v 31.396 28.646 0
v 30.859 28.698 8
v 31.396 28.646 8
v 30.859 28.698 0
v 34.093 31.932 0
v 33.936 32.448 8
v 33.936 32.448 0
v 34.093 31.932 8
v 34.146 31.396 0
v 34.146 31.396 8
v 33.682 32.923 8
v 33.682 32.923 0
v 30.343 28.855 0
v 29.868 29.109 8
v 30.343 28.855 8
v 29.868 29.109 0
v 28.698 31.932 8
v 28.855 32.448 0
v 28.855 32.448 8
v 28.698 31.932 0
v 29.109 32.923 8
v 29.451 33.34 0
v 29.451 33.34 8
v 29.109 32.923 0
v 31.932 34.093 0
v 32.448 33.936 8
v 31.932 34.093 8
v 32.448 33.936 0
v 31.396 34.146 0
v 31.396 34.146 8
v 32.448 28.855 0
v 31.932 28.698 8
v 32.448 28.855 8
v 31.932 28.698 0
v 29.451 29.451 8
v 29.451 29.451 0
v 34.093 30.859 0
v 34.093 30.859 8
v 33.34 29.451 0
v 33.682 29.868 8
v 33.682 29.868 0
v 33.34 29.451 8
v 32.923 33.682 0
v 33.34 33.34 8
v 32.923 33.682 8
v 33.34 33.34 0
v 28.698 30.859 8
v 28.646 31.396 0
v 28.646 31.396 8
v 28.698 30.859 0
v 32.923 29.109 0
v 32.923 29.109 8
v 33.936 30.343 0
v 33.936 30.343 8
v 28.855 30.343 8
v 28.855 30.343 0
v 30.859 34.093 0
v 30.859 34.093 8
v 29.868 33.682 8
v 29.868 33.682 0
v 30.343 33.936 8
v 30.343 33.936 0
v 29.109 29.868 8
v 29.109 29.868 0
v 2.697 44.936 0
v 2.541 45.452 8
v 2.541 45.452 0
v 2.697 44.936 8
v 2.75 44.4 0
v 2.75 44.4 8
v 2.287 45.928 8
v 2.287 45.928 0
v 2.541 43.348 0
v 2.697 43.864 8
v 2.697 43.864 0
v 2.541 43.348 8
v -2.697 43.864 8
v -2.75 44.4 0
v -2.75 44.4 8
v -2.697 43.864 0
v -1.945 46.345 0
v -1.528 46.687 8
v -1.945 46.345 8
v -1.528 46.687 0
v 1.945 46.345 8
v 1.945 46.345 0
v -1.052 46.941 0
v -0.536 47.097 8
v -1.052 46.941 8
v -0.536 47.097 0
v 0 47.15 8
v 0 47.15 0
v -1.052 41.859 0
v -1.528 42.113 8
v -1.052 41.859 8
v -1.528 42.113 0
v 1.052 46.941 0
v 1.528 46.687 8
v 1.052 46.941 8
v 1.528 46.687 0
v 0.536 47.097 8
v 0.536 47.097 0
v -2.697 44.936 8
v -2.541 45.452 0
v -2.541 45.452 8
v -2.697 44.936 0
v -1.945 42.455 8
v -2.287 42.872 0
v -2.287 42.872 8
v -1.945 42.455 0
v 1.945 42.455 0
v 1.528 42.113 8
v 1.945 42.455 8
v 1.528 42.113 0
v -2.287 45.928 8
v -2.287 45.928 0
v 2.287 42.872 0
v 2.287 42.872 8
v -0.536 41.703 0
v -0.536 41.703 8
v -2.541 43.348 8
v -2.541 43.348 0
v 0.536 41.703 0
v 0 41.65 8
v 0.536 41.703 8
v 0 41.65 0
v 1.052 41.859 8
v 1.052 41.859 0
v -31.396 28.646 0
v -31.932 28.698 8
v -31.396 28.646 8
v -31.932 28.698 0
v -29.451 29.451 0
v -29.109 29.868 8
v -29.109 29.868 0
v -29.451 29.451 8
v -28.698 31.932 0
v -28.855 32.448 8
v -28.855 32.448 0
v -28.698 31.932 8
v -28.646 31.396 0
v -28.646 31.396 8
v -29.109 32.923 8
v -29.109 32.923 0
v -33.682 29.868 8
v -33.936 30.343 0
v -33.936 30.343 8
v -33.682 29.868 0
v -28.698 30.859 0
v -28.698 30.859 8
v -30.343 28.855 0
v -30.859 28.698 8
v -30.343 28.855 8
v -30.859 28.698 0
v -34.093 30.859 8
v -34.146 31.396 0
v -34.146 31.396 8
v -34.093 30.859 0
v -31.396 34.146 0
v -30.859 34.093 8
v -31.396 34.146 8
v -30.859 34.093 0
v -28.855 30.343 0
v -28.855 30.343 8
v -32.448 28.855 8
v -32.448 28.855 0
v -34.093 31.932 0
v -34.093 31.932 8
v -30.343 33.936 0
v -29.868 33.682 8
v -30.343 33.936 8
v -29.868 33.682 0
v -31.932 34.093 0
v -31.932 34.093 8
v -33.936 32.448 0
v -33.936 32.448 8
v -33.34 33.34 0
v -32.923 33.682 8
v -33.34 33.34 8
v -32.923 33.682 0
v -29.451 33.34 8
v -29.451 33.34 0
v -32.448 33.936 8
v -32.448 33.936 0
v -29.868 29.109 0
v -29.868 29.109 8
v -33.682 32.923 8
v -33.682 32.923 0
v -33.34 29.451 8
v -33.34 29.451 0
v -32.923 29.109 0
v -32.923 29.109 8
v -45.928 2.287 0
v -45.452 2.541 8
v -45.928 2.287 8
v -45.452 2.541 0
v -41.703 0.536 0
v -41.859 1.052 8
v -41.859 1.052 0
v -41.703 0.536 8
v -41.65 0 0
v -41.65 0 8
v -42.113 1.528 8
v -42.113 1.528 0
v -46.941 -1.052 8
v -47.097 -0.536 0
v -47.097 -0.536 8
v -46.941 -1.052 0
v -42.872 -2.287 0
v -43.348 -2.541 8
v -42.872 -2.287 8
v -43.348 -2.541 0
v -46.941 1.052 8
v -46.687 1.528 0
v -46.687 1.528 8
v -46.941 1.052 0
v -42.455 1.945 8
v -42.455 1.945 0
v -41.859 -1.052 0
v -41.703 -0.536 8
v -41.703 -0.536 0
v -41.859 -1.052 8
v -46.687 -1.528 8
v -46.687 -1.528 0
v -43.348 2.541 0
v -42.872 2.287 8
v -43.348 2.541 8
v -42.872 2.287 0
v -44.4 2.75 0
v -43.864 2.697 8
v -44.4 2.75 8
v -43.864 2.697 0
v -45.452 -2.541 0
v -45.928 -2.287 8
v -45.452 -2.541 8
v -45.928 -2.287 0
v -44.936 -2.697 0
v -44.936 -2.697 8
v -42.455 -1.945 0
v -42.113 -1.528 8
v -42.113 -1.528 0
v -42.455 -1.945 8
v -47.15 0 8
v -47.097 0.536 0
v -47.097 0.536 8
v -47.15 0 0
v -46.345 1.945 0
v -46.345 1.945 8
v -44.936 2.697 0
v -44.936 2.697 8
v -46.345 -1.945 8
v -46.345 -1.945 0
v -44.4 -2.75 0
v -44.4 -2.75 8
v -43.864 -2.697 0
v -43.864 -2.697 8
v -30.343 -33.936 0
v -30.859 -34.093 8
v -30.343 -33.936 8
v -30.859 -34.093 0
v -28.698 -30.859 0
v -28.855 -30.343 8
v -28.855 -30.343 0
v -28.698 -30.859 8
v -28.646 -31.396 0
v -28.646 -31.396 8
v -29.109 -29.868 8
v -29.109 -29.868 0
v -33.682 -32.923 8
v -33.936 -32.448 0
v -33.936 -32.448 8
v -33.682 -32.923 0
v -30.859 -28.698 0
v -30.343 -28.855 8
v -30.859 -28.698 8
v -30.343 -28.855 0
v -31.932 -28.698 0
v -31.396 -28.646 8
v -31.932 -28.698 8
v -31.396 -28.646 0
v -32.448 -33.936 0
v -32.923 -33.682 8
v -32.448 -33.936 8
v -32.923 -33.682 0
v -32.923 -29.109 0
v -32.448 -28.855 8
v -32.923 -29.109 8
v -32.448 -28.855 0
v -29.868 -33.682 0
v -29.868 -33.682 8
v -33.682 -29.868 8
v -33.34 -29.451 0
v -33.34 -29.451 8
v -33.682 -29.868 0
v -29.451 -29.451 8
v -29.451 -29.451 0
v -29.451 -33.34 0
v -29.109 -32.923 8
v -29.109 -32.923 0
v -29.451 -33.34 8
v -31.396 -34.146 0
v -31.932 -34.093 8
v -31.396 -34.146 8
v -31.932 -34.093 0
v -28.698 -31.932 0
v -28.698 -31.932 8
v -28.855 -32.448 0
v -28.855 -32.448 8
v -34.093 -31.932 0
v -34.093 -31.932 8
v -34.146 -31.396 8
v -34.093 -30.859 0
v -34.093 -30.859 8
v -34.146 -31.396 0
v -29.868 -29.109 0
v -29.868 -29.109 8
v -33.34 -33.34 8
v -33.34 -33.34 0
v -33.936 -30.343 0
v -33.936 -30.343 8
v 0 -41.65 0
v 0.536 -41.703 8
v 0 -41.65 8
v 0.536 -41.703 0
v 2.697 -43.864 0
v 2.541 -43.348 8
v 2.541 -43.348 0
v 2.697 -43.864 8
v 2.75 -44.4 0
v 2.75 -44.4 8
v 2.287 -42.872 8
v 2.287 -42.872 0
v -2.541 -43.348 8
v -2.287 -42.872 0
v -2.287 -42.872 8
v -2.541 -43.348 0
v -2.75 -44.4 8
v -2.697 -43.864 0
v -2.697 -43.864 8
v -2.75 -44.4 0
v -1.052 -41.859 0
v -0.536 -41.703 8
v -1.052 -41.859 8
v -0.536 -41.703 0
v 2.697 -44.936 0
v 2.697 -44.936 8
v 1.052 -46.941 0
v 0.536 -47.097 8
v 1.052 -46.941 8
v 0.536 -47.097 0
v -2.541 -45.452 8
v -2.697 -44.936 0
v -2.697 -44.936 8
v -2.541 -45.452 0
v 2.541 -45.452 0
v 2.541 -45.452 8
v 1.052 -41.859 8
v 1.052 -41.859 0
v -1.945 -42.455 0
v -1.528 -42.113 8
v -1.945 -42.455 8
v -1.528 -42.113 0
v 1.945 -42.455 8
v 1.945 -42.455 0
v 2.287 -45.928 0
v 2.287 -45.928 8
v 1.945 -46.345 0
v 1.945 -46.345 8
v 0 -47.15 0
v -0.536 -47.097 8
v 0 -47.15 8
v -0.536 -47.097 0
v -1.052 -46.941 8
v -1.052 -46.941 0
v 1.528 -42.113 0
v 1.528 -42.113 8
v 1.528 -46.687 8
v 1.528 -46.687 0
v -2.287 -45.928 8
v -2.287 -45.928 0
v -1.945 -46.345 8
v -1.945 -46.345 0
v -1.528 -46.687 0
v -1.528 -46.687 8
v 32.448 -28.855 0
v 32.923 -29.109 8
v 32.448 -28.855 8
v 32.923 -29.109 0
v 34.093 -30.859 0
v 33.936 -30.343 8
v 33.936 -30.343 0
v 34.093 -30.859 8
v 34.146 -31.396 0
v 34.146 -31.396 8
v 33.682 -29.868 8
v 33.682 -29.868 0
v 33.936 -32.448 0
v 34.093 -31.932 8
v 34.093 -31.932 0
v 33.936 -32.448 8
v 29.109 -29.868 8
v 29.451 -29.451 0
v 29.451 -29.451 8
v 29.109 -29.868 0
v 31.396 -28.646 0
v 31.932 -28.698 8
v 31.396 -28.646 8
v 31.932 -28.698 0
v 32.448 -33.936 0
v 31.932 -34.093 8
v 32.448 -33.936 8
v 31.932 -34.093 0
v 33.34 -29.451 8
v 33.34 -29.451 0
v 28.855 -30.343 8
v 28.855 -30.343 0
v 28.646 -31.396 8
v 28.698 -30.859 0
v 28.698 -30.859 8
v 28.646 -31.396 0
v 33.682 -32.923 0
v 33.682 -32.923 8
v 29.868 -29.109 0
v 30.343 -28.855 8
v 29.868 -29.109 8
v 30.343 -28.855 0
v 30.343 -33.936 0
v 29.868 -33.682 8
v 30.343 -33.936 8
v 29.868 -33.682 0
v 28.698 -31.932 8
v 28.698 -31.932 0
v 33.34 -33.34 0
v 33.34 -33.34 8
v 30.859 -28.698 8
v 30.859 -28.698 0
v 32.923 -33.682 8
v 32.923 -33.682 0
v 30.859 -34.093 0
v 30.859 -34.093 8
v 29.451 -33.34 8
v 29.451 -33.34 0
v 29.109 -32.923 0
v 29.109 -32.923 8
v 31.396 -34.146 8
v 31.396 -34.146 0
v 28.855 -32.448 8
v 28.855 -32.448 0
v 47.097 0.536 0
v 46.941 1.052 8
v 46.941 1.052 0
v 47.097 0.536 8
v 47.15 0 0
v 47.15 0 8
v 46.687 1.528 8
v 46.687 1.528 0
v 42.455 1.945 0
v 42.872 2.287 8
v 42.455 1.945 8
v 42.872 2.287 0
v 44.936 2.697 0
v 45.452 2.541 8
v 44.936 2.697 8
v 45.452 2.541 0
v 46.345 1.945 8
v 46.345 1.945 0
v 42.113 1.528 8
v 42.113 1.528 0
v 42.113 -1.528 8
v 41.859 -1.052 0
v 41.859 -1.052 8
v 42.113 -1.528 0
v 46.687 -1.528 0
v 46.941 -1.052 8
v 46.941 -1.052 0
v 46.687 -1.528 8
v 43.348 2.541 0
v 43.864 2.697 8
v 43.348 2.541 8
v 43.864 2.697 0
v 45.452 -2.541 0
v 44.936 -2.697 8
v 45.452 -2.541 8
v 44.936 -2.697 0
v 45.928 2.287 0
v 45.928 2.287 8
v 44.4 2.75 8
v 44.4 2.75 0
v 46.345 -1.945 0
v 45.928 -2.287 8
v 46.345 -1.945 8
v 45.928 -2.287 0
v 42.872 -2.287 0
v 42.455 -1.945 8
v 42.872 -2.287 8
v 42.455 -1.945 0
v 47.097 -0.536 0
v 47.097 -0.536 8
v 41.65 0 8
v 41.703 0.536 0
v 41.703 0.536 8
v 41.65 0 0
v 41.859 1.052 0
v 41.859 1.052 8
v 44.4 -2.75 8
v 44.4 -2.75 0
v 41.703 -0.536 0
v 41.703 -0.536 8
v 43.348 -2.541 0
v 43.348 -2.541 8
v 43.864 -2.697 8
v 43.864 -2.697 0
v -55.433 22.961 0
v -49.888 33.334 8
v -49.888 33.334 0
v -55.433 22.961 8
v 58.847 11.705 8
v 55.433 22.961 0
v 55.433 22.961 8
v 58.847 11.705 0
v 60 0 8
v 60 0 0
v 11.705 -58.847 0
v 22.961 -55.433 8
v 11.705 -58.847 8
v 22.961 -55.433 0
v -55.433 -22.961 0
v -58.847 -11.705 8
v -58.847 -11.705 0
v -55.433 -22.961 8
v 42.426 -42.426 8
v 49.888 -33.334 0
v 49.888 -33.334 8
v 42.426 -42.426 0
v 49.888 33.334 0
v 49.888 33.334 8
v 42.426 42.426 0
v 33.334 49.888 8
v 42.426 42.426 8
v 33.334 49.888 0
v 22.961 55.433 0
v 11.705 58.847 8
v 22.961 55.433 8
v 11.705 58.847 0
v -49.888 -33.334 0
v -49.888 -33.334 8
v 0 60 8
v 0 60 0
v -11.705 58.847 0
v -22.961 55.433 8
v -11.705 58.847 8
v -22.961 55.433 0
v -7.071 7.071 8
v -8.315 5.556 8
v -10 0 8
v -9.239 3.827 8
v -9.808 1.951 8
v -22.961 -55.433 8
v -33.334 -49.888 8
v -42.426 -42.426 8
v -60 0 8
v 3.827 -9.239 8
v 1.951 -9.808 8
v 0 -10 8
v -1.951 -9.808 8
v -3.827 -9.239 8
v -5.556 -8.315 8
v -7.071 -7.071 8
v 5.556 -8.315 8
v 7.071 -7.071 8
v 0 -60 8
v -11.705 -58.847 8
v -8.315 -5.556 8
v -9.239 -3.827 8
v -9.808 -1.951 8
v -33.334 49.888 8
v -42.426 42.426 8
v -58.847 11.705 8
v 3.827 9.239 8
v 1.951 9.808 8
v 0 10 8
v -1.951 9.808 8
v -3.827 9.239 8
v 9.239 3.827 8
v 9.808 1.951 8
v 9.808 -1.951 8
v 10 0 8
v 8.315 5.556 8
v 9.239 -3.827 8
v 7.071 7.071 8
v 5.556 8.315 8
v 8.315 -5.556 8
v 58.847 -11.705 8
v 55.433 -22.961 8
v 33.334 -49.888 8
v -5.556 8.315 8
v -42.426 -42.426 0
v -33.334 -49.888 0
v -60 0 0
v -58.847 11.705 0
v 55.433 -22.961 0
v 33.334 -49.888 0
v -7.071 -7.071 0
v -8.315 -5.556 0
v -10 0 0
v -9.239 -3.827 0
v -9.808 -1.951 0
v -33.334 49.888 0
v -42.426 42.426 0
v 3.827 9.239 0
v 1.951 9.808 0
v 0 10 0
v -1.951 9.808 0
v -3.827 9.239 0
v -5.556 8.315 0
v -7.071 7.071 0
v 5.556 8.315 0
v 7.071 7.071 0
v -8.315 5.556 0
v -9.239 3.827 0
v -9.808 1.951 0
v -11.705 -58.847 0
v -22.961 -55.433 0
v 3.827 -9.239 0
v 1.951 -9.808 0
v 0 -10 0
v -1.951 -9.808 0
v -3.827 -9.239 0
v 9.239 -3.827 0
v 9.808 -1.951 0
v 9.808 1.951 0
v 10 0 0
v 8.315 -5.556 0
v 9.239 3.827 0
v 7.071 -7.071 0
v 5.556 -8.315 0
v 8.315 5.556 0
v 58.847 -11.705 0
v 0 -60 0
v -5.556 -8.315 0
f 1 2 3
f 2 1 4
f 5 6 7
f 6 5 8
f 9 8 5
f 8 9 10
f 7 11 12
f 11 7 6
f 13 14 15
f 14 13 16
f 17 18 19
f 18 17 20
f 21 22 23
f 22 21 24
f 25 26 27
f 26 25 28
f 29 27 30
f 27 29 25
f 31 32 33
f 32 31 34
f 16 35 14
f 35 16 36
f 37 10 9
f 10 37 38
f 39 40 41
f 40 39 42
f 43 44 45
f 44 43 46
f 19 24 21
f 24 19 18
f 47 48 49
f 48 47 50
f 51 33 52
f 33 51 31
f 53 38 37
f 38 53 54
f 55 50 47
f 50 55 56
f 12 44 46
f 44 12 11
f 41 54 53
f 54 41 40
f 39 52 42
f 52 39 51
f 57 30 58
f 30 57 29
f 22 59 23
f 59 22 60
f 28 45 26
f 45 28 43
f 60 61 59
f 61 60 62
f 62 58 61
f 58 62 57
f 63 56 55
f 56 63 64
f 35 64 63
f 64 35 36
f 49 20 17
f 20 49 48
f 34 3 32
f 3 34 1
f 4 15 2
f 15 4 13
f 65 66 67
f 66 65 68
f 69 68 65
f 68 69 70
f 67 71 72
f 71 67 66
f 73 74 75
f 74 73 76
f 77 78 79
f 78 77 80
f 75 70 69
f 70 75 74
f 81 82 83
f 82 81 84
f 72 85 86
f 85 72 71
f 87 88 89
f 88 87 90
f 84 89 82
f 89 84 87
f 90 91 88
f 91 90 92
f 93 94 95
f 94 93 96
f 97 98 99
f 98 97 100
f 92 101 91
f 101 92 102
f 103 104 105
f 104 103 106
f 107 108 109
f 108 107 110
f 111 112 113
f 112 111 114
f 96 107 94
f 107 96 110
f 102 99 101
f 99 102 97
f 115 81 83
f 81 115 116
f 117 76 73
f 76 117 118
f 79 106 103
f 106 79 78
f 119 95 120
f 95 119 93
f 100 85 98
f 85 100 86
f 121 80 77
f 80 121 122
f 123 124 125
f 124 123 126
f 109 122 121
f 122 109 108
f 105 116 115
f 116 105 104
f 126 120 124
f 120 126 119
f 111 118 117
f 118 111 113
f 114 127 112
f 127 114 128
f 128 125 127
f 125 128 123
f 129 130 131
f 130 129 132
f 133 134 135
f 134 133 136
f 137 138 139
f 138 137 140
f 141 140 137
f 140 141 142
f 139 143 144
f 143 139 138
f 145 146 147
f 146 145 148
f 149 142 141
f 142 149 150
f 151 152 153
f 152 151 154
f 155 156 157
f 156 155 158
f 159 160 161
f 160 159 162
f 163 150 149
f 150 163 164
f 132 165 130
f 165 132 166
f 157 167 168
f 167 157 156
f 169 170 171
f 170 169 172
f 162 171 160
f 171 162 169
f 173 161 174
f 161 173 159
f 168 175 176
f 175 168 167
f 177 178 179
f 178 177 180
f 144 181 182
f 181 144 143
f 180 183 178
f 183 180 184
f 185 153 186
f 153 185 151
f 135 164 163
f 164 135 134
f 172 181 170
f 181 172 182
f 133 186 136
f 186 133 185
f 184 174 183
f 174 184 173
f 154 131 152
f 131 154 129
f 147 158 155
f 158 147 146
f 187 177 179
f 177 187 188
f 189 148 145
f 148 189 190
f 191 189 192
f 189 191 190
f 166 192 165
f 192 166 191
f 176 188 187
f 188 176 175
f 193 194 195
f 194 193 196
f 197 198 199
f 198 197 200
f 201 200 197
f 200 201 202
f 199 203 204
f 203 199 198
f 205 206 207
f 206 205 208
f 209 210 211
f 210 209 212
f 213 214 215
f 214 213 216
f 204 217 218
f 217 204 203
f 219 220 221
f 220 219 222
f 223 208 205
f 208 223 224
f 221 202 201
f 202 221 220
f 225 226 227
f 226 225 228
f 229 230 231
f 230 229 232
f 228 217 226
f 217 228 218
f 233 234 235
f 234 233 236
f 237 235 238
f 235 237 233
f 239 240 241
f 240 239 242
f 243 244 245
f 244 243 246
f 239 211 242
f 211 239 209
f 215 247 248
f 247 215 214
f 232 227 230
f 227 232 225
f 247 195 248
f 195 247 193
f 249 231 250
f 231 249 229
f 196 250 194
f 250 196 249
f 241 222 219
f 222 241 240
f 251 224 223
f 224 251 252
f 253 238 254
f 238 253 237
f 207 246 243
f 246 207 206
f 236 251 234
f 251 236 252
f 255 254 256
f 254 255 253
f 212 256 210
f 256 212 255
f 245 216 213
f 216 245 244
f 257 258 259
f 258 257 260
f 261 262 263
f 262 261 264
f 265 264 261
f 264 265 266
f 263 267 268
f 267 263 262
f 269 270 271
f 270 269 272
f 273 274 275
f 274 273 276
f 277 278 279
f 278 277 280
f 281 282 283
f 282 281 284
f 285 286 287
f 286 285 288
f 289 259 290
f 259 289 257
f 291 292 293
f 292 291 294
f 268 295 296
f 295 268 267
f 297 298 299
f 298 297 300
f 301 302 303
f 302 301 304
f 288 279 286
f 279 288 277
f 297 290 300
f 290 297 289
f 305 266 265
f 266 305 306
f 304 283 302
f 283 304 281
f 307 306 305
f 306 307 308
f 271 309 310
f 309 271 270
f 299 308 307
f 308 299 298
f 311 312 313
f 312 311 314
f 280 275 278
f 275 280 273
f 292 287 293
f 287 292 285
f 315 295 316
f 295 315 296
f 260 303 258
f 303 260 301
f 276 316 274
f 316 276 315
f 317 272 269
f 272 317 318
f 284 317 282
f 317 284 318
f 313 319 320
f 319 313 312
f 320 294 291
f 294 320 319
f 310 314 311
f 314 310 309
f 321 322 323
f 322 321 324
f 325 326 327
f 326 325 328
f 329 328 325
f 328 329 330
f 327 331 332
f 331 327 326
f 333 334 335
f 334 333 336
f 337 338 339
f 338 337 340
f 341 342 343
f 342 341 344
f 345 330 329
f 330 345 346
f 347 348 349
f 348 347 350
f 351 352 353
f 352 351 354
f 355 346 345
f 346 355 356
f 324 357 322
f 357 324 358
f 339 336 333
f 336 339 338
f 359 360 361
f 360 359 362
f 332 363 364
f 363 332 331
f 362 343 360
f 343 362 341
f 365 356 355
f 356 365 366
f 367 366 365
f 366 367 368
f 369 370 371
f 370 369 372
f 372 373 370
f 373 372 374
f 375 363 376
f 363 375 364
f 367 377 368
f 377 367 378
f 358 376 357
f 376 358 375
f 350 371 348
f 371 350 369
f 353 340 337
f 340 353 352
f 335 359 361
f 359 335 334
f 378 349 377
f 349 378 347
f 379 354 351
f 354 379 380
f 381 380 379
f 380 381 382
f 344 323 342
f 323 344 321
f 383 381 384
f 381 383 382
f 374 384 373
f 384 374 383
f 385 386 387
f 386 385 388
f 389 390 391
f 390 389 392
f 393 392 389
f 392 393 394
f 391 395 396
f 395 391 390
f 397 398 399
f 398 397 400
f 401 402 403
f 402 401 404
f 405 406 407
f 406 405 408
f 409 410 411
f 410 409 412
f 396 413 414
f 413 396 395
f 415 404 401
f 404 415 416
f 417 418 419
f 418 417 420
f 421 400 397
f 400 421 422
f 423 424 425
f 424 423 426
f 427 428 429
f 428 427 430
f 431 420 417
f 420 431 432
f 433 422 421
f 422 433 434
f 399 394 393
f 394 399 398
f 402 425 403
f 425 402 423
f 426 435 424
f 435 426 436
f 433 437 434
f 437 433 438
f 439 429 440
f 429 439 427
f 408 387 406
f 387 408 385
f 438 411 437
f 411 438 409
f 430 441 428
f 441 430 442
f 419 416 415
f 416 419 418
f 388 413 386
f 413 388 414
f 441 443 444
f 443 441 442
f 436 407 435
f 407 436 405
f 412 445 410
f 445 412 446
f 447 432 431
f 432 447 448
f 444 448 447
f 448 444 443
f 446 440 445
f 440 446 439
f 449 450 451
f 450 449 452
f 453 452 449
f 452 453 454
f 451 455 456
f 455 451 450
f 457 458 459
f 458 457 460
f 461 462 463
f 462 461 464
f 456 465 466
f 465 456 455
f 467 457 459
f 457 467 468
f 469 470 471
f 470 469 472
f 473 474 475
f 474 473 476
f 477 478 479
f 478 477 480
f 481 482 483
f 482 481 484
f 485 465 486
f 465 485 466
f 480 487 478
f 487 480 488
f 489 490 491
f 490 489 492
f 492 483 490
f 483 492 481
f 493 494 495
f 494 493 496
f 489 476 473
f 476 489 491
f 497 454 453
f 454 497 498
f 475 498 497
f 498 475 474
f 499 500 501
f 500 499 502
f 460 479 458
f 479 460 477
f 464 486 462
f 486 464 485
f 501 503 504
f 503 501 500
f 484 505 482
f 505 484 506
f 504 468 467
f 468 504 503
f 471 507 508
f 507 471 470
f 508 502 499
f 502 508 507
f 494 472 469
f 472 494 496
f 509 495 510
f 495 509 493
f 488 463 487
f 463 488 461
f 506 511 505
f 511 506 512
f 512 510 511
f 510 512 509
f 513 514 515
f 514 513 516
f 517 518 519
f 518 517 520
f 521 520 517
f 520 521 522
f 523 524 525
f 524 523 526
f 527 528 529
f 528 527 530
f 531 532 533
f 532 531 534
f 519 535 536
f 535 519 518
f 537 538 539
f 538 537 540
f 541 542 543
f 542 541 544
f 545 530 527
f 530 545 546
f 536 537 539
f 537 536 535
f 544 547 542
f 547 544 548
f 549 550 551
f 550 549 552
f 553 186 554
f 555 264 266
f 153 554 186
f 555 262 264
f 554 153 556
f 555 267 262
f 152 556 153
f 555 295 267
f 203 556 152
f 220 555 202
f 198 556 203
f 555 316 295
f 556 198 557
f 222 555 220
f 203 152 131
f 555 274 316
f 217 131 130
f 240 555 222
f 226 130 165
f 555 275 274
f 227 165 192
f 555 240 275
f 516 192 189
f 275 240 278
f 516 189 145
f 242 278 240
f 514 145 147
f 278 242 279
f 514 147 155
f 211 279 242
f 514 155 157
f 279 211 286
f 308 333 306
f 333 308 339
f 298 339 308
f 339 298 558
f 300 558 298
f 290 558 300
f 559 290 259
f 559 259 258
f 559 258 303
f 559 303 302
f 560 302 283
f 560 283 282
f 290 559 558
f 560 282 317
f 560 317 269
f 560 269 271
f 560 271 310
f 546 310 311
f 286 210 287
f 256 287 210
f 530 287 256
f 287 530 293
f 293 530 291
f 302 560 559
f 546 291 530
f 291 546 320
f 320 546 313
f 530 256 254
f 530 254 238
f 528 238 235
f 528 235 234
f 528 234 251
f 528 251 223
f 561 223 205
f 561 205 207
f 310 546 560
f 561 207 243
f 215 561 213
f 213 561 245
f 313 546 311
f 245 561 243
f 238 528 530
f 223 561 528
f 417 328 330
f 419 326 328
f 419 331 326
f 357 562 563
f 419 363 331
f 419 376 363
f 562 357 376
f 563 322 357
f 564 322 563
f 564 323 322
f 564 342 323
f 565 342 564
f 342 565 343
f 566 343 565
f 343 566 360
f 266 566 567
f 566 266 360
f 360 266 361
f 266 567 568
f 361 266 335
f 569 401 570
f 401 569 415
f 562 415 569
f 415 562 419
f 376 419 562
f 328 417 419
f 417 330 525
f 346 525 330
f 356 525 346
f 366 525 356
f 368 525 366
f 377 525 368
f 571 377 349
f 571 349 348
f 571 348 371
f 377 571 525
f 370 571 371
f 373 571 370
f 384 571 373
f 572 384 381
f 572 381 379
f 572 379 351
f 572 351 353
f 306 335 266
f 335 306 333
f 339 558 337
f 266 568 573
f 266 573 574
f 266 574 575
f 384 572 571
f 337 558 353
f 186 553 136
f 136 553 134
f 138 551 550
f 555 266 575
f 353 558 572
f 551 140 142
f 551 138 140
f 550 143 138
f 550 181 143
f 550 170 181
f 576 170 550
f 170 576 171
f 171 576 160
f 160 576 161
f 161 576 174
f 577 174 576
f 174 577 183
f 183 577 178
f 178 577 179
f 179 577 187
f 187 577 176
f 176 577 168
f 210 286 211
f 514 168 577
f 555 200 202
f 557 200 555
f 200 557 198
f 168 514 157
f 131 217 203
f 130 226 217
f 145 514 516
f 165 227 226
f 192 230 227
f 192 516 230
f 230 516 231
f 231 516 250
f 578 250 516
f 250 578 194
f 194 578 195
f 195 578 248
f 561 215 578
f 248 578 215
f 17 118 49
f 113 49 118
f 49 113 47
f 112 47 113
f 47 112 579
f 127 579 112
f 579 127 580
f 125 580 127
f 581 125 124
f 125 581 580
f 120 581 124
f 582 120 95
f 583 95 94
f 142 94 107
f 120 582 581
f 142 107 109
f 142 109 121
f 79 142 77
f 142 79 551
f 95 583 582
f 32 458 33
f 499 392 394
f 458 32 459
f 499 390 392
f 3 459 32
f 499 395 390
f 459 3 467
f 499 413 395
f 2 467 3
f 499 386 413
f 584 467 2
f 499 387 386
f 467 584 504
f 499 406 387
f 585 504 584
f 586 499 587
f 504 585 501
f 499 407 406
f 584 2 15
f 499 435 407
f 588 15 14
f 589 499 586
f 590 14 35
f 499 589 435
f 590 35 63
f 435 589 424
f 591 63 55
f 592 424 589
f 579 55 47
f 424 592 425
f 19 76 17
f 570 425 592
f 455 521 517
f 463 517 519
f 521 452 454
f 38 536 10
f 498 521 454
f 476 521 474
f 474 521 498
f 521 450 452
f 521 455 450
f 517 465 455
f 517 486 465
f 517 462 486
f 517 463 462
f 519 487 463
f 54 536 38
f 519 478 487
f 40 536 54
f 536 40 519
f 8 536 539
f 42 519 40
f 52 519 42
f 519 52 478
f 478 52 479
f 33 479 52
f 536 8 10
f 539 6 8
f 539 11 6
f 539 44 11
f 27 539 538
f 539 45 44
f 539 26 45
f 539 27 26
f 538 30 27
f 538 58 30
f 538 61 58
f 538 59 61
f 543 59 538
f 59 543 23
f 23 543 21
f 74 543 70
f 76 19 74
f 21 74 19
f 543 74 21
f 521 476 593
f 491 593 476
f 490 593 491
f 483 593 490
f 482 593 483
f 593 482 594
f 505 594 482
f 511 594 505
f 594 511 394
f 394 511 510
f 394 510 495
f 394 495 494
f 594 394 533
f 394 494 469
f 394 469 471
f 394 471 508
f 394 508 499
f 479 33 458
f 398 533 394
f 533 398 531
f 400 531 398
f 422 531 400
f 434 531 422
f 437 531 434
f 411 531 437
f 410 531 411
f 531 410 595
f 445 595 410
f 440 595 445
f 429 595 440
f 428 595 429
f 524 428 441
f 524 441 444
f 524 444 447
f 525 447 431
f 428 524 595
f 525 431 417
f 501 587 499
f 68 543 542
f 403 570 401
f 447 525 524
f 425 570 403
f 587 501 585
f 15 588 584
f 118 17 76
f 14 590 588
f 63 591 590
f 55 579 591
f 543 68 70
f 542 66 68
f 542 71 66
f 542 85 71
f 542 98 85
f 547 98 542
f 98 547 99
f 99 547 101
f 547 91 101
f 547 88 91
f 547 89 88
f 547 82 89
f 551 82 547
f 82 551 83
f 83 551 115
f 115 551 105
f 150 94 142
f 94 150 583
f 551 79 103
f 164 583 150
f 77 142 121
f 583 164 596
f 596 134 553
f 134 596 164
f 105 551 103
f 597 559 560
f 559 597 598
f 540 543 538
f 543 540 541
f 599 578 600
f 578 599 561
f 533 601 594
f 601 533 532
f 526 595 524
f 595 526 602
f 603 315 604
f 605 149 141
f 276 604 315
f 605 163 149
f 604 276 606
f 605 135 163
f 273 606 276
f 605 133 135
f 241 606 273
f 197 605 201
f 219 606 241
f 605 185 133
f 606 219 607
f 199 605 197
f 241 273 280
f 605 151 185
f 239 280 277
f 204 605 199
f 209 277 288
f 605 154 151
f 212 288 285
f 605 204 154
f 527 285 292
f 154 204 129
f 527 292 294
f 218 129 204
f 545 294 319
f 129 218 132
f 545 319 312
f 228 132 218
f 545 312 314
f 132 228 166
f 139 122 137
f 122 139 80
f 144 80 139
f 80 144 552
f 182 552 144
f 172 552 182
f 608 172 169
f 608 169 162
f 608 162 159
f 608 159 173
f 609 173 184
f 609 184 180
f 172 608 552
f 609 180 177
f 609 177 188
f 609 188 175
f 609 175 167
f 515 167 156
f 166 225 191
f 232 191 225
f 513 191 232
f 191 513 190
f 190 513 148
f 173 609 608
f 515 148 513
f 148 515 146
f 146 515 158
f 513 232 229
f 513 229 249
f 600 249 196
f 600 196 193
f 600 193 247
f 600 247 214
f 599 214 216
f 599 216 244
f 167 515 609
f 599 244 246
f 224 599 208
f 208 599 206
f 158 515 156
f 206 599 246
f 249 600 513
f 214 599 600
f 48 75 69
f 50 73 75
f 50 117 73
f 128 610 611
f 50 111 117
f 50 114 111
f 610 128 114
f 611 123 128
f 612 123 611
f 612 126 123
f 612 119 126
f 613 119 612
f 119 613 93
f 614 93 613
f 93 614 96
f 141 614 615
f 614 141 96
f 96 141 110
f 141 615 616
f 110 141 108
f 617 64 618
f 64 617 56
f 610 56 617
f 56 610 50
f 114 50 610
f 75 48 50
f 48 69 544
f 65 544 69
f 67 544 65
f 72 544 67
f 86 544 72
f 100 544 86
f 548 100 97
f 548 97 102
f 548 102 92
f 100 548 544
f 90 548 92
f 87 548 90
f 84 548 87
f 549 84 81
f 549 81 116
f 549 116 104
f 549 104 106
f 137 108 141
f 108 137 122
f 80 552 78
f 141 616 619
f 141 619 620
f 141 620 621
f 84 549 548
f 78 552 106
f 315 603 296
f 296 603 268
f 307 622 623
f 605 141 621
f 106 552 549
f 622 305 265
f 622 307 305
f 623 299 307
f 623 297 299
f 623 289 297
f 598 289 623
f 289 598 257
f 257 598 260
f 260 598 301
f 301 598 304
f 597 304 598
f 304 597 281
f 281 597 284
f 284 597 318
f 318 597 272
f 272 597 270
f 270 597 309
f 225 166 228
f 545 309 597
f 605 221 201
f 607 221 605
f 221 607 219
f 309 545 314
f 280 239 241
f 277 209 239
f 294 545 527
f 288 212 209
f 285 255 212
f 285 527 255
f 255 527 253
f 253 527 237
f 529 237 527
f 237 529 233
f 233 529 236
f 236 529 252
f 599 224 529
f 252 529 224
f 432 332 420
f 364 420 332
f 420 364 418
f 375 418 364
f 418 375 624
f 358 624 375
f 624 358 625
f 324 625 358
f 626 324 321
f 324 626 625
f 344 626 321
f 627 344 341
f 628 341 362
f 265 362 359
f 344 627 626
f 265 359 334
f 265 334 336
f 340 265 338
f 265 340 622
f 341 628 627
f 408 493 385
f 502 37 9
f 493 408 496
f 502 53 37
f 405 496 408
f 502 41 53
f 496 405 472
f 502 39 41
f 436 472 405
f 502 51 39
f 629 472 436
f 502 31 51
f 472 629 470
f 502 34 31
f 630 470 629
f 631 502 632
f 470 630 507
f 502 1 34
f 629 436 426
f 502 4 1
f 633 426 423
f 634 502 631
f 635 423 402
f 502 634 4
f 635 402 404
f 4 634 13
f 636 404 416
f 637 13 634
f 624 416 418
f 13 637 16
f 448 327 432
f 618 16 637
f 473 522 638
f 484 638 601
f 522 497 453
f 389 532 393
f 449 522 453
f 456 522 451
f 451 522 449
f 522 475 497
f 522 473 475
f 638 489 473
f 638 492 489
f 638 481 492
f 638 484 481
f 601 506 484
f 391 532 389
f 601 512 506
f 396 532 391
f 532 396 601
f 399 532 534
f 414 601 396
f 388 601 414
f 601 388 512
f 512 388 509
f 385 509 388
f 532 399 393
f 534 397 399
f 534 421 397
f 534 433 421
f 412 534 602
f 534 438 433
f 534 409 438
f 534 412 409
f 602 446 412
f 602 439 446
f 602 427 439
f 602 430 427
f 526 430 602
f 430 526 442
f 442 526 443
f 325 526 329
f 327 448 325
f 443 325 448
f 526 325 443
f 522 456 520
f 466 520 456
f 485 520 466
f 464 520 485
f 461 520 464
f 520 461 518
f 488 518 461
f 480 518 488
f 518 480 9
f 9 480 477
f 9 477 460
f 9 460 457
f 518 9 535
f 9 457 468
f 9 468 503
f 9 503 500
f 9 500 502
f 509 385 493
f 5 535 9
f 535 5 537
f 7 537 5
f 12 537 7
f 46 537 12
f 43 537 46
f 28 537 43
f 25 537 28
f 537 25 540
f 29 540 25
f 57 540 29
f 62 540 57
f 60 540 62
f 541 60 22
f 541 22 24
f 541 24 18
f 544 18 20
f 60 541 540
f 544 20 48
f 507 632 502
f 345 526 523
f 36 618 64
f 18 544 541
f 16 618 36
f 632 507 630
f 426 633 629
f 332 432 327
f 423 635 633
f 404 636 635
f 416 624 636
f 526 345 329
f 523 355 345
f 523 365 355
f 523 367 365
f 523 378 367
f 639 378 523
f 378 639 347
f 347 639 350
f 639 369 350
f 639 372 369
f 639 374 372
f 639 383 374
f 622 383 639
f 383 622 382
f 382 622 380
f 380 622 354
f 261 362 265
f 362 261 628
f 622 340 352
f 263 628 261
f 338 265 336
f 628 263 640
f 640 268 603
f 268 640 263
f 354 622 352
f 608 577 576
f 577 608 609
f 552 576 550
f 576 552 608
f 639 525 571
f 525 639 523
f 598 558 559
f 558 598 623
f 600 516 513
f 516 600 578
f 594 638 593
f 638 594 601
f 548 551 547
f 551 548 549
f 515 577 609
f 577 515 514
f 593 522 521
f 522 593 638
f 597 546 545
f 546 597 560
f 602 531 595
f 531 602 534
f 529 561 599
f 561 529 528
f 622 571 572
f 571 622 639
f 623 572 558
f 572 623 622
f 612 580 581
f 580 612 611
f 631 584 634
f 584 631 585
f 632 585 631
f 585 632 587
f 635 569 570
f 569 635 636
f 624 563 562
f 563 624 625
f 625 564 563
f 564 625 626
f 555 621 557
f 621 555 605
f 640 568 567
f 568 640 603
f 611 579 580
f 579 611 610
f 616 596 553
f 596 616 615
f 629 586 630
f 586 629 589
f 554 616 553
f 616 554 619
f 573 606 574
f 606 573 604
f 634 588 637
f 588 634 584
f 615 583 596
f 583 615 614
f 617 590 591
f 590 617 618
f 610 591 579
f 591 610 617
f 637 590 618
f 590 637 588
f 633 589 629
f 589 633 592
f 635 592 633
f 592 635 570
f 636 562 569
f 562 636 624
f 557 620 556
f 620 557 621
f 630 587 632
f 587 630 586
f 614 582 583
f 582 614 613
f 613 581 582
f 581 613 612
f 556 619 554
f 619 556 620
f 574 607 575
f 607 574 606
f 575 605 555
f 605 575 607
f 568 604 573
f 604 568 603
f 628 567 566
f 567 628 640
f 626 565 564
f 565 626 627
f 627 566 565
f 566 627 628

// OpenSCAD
$fn = 32;

// ----------------------------------------------------------------------
// Flange Ø120 x 8
// 8 holes on a Ø88.8 bolt circle, bolted joints
// ----------------------------------------------------------------------

// --- parameters (mm) ---
flange_d = 120;  // outside diameter of the flange
thickness = 8;   // flange thickness
holes = 8;       // number of bolt holes
pcd = 88.8;      // bolt circle diameter
start_deg = 45;  // angle of the first hole, from +X
hole_d = 5.5;    // bolt hole diameter
bore_d = 20;     // central through bore
hub_d = 28;      // hub outside diameter
hub_h = 0;       // hub height above the flange face (0 = no hub)

// --- derived feature positions (mm) ---
height = thickness + hub_h;  // = 8   overall height of the part
pcd_r = pcd / 2;             // = 44.4   bolt circle radius
hole_step = 360 / holes;     // = 45   angular pitch
feature_centers = [
  [pcd_r * cos(start_deg + 0 * hole_step), pcd_r * sin(start_deg + 0 * hole_step)],
  [pcd_r * cos(start_deg + 1 * hole_step), pcd_r * sin(start_deg + 1 * hole_step)],
  [pcd_r * cos(start_deg + 2 * hole_step), pcd_r * sin(start_deg + 2 * hole_step)],
  [pcd_r * cos(start_deg + 3 * hole_step), pcd_r * sin(start_deg + 3 * hole_step)],
  [pcd_r * cos(start_deg + 4 * hole_step), pcd_r * sin(start_deg + 4 * hole_step)],
  [pcd_r * cos(start_deg + 5 * hole_step), pcd_r * sin(start_deg + 5 * hole_step)],
  [pcd_r * cos(start_deg + 6 * hole_step), pcd_r * sin(start_deg + 6 * hole_step)],
  [pcd_r * cos(start_deg + 7 * hole_step), pcd_r * sin(start_deg + 7 * hole_step)]
];   // bolt hole centres on the pitch circle

// flange disc, every hole and the bore cut straight through
difference() {
  union() {
    cylinder(d = flange_d, h = thickness);
  }
  translate([0, 0, -1]) cylinder(d = bore_d, h = height + 2);  // bore, through
  for (centre = feature_centers)
    translate([centre[0], centre[1], -1]) cylinder(d = hole_d, h = thickness + 2);
}
